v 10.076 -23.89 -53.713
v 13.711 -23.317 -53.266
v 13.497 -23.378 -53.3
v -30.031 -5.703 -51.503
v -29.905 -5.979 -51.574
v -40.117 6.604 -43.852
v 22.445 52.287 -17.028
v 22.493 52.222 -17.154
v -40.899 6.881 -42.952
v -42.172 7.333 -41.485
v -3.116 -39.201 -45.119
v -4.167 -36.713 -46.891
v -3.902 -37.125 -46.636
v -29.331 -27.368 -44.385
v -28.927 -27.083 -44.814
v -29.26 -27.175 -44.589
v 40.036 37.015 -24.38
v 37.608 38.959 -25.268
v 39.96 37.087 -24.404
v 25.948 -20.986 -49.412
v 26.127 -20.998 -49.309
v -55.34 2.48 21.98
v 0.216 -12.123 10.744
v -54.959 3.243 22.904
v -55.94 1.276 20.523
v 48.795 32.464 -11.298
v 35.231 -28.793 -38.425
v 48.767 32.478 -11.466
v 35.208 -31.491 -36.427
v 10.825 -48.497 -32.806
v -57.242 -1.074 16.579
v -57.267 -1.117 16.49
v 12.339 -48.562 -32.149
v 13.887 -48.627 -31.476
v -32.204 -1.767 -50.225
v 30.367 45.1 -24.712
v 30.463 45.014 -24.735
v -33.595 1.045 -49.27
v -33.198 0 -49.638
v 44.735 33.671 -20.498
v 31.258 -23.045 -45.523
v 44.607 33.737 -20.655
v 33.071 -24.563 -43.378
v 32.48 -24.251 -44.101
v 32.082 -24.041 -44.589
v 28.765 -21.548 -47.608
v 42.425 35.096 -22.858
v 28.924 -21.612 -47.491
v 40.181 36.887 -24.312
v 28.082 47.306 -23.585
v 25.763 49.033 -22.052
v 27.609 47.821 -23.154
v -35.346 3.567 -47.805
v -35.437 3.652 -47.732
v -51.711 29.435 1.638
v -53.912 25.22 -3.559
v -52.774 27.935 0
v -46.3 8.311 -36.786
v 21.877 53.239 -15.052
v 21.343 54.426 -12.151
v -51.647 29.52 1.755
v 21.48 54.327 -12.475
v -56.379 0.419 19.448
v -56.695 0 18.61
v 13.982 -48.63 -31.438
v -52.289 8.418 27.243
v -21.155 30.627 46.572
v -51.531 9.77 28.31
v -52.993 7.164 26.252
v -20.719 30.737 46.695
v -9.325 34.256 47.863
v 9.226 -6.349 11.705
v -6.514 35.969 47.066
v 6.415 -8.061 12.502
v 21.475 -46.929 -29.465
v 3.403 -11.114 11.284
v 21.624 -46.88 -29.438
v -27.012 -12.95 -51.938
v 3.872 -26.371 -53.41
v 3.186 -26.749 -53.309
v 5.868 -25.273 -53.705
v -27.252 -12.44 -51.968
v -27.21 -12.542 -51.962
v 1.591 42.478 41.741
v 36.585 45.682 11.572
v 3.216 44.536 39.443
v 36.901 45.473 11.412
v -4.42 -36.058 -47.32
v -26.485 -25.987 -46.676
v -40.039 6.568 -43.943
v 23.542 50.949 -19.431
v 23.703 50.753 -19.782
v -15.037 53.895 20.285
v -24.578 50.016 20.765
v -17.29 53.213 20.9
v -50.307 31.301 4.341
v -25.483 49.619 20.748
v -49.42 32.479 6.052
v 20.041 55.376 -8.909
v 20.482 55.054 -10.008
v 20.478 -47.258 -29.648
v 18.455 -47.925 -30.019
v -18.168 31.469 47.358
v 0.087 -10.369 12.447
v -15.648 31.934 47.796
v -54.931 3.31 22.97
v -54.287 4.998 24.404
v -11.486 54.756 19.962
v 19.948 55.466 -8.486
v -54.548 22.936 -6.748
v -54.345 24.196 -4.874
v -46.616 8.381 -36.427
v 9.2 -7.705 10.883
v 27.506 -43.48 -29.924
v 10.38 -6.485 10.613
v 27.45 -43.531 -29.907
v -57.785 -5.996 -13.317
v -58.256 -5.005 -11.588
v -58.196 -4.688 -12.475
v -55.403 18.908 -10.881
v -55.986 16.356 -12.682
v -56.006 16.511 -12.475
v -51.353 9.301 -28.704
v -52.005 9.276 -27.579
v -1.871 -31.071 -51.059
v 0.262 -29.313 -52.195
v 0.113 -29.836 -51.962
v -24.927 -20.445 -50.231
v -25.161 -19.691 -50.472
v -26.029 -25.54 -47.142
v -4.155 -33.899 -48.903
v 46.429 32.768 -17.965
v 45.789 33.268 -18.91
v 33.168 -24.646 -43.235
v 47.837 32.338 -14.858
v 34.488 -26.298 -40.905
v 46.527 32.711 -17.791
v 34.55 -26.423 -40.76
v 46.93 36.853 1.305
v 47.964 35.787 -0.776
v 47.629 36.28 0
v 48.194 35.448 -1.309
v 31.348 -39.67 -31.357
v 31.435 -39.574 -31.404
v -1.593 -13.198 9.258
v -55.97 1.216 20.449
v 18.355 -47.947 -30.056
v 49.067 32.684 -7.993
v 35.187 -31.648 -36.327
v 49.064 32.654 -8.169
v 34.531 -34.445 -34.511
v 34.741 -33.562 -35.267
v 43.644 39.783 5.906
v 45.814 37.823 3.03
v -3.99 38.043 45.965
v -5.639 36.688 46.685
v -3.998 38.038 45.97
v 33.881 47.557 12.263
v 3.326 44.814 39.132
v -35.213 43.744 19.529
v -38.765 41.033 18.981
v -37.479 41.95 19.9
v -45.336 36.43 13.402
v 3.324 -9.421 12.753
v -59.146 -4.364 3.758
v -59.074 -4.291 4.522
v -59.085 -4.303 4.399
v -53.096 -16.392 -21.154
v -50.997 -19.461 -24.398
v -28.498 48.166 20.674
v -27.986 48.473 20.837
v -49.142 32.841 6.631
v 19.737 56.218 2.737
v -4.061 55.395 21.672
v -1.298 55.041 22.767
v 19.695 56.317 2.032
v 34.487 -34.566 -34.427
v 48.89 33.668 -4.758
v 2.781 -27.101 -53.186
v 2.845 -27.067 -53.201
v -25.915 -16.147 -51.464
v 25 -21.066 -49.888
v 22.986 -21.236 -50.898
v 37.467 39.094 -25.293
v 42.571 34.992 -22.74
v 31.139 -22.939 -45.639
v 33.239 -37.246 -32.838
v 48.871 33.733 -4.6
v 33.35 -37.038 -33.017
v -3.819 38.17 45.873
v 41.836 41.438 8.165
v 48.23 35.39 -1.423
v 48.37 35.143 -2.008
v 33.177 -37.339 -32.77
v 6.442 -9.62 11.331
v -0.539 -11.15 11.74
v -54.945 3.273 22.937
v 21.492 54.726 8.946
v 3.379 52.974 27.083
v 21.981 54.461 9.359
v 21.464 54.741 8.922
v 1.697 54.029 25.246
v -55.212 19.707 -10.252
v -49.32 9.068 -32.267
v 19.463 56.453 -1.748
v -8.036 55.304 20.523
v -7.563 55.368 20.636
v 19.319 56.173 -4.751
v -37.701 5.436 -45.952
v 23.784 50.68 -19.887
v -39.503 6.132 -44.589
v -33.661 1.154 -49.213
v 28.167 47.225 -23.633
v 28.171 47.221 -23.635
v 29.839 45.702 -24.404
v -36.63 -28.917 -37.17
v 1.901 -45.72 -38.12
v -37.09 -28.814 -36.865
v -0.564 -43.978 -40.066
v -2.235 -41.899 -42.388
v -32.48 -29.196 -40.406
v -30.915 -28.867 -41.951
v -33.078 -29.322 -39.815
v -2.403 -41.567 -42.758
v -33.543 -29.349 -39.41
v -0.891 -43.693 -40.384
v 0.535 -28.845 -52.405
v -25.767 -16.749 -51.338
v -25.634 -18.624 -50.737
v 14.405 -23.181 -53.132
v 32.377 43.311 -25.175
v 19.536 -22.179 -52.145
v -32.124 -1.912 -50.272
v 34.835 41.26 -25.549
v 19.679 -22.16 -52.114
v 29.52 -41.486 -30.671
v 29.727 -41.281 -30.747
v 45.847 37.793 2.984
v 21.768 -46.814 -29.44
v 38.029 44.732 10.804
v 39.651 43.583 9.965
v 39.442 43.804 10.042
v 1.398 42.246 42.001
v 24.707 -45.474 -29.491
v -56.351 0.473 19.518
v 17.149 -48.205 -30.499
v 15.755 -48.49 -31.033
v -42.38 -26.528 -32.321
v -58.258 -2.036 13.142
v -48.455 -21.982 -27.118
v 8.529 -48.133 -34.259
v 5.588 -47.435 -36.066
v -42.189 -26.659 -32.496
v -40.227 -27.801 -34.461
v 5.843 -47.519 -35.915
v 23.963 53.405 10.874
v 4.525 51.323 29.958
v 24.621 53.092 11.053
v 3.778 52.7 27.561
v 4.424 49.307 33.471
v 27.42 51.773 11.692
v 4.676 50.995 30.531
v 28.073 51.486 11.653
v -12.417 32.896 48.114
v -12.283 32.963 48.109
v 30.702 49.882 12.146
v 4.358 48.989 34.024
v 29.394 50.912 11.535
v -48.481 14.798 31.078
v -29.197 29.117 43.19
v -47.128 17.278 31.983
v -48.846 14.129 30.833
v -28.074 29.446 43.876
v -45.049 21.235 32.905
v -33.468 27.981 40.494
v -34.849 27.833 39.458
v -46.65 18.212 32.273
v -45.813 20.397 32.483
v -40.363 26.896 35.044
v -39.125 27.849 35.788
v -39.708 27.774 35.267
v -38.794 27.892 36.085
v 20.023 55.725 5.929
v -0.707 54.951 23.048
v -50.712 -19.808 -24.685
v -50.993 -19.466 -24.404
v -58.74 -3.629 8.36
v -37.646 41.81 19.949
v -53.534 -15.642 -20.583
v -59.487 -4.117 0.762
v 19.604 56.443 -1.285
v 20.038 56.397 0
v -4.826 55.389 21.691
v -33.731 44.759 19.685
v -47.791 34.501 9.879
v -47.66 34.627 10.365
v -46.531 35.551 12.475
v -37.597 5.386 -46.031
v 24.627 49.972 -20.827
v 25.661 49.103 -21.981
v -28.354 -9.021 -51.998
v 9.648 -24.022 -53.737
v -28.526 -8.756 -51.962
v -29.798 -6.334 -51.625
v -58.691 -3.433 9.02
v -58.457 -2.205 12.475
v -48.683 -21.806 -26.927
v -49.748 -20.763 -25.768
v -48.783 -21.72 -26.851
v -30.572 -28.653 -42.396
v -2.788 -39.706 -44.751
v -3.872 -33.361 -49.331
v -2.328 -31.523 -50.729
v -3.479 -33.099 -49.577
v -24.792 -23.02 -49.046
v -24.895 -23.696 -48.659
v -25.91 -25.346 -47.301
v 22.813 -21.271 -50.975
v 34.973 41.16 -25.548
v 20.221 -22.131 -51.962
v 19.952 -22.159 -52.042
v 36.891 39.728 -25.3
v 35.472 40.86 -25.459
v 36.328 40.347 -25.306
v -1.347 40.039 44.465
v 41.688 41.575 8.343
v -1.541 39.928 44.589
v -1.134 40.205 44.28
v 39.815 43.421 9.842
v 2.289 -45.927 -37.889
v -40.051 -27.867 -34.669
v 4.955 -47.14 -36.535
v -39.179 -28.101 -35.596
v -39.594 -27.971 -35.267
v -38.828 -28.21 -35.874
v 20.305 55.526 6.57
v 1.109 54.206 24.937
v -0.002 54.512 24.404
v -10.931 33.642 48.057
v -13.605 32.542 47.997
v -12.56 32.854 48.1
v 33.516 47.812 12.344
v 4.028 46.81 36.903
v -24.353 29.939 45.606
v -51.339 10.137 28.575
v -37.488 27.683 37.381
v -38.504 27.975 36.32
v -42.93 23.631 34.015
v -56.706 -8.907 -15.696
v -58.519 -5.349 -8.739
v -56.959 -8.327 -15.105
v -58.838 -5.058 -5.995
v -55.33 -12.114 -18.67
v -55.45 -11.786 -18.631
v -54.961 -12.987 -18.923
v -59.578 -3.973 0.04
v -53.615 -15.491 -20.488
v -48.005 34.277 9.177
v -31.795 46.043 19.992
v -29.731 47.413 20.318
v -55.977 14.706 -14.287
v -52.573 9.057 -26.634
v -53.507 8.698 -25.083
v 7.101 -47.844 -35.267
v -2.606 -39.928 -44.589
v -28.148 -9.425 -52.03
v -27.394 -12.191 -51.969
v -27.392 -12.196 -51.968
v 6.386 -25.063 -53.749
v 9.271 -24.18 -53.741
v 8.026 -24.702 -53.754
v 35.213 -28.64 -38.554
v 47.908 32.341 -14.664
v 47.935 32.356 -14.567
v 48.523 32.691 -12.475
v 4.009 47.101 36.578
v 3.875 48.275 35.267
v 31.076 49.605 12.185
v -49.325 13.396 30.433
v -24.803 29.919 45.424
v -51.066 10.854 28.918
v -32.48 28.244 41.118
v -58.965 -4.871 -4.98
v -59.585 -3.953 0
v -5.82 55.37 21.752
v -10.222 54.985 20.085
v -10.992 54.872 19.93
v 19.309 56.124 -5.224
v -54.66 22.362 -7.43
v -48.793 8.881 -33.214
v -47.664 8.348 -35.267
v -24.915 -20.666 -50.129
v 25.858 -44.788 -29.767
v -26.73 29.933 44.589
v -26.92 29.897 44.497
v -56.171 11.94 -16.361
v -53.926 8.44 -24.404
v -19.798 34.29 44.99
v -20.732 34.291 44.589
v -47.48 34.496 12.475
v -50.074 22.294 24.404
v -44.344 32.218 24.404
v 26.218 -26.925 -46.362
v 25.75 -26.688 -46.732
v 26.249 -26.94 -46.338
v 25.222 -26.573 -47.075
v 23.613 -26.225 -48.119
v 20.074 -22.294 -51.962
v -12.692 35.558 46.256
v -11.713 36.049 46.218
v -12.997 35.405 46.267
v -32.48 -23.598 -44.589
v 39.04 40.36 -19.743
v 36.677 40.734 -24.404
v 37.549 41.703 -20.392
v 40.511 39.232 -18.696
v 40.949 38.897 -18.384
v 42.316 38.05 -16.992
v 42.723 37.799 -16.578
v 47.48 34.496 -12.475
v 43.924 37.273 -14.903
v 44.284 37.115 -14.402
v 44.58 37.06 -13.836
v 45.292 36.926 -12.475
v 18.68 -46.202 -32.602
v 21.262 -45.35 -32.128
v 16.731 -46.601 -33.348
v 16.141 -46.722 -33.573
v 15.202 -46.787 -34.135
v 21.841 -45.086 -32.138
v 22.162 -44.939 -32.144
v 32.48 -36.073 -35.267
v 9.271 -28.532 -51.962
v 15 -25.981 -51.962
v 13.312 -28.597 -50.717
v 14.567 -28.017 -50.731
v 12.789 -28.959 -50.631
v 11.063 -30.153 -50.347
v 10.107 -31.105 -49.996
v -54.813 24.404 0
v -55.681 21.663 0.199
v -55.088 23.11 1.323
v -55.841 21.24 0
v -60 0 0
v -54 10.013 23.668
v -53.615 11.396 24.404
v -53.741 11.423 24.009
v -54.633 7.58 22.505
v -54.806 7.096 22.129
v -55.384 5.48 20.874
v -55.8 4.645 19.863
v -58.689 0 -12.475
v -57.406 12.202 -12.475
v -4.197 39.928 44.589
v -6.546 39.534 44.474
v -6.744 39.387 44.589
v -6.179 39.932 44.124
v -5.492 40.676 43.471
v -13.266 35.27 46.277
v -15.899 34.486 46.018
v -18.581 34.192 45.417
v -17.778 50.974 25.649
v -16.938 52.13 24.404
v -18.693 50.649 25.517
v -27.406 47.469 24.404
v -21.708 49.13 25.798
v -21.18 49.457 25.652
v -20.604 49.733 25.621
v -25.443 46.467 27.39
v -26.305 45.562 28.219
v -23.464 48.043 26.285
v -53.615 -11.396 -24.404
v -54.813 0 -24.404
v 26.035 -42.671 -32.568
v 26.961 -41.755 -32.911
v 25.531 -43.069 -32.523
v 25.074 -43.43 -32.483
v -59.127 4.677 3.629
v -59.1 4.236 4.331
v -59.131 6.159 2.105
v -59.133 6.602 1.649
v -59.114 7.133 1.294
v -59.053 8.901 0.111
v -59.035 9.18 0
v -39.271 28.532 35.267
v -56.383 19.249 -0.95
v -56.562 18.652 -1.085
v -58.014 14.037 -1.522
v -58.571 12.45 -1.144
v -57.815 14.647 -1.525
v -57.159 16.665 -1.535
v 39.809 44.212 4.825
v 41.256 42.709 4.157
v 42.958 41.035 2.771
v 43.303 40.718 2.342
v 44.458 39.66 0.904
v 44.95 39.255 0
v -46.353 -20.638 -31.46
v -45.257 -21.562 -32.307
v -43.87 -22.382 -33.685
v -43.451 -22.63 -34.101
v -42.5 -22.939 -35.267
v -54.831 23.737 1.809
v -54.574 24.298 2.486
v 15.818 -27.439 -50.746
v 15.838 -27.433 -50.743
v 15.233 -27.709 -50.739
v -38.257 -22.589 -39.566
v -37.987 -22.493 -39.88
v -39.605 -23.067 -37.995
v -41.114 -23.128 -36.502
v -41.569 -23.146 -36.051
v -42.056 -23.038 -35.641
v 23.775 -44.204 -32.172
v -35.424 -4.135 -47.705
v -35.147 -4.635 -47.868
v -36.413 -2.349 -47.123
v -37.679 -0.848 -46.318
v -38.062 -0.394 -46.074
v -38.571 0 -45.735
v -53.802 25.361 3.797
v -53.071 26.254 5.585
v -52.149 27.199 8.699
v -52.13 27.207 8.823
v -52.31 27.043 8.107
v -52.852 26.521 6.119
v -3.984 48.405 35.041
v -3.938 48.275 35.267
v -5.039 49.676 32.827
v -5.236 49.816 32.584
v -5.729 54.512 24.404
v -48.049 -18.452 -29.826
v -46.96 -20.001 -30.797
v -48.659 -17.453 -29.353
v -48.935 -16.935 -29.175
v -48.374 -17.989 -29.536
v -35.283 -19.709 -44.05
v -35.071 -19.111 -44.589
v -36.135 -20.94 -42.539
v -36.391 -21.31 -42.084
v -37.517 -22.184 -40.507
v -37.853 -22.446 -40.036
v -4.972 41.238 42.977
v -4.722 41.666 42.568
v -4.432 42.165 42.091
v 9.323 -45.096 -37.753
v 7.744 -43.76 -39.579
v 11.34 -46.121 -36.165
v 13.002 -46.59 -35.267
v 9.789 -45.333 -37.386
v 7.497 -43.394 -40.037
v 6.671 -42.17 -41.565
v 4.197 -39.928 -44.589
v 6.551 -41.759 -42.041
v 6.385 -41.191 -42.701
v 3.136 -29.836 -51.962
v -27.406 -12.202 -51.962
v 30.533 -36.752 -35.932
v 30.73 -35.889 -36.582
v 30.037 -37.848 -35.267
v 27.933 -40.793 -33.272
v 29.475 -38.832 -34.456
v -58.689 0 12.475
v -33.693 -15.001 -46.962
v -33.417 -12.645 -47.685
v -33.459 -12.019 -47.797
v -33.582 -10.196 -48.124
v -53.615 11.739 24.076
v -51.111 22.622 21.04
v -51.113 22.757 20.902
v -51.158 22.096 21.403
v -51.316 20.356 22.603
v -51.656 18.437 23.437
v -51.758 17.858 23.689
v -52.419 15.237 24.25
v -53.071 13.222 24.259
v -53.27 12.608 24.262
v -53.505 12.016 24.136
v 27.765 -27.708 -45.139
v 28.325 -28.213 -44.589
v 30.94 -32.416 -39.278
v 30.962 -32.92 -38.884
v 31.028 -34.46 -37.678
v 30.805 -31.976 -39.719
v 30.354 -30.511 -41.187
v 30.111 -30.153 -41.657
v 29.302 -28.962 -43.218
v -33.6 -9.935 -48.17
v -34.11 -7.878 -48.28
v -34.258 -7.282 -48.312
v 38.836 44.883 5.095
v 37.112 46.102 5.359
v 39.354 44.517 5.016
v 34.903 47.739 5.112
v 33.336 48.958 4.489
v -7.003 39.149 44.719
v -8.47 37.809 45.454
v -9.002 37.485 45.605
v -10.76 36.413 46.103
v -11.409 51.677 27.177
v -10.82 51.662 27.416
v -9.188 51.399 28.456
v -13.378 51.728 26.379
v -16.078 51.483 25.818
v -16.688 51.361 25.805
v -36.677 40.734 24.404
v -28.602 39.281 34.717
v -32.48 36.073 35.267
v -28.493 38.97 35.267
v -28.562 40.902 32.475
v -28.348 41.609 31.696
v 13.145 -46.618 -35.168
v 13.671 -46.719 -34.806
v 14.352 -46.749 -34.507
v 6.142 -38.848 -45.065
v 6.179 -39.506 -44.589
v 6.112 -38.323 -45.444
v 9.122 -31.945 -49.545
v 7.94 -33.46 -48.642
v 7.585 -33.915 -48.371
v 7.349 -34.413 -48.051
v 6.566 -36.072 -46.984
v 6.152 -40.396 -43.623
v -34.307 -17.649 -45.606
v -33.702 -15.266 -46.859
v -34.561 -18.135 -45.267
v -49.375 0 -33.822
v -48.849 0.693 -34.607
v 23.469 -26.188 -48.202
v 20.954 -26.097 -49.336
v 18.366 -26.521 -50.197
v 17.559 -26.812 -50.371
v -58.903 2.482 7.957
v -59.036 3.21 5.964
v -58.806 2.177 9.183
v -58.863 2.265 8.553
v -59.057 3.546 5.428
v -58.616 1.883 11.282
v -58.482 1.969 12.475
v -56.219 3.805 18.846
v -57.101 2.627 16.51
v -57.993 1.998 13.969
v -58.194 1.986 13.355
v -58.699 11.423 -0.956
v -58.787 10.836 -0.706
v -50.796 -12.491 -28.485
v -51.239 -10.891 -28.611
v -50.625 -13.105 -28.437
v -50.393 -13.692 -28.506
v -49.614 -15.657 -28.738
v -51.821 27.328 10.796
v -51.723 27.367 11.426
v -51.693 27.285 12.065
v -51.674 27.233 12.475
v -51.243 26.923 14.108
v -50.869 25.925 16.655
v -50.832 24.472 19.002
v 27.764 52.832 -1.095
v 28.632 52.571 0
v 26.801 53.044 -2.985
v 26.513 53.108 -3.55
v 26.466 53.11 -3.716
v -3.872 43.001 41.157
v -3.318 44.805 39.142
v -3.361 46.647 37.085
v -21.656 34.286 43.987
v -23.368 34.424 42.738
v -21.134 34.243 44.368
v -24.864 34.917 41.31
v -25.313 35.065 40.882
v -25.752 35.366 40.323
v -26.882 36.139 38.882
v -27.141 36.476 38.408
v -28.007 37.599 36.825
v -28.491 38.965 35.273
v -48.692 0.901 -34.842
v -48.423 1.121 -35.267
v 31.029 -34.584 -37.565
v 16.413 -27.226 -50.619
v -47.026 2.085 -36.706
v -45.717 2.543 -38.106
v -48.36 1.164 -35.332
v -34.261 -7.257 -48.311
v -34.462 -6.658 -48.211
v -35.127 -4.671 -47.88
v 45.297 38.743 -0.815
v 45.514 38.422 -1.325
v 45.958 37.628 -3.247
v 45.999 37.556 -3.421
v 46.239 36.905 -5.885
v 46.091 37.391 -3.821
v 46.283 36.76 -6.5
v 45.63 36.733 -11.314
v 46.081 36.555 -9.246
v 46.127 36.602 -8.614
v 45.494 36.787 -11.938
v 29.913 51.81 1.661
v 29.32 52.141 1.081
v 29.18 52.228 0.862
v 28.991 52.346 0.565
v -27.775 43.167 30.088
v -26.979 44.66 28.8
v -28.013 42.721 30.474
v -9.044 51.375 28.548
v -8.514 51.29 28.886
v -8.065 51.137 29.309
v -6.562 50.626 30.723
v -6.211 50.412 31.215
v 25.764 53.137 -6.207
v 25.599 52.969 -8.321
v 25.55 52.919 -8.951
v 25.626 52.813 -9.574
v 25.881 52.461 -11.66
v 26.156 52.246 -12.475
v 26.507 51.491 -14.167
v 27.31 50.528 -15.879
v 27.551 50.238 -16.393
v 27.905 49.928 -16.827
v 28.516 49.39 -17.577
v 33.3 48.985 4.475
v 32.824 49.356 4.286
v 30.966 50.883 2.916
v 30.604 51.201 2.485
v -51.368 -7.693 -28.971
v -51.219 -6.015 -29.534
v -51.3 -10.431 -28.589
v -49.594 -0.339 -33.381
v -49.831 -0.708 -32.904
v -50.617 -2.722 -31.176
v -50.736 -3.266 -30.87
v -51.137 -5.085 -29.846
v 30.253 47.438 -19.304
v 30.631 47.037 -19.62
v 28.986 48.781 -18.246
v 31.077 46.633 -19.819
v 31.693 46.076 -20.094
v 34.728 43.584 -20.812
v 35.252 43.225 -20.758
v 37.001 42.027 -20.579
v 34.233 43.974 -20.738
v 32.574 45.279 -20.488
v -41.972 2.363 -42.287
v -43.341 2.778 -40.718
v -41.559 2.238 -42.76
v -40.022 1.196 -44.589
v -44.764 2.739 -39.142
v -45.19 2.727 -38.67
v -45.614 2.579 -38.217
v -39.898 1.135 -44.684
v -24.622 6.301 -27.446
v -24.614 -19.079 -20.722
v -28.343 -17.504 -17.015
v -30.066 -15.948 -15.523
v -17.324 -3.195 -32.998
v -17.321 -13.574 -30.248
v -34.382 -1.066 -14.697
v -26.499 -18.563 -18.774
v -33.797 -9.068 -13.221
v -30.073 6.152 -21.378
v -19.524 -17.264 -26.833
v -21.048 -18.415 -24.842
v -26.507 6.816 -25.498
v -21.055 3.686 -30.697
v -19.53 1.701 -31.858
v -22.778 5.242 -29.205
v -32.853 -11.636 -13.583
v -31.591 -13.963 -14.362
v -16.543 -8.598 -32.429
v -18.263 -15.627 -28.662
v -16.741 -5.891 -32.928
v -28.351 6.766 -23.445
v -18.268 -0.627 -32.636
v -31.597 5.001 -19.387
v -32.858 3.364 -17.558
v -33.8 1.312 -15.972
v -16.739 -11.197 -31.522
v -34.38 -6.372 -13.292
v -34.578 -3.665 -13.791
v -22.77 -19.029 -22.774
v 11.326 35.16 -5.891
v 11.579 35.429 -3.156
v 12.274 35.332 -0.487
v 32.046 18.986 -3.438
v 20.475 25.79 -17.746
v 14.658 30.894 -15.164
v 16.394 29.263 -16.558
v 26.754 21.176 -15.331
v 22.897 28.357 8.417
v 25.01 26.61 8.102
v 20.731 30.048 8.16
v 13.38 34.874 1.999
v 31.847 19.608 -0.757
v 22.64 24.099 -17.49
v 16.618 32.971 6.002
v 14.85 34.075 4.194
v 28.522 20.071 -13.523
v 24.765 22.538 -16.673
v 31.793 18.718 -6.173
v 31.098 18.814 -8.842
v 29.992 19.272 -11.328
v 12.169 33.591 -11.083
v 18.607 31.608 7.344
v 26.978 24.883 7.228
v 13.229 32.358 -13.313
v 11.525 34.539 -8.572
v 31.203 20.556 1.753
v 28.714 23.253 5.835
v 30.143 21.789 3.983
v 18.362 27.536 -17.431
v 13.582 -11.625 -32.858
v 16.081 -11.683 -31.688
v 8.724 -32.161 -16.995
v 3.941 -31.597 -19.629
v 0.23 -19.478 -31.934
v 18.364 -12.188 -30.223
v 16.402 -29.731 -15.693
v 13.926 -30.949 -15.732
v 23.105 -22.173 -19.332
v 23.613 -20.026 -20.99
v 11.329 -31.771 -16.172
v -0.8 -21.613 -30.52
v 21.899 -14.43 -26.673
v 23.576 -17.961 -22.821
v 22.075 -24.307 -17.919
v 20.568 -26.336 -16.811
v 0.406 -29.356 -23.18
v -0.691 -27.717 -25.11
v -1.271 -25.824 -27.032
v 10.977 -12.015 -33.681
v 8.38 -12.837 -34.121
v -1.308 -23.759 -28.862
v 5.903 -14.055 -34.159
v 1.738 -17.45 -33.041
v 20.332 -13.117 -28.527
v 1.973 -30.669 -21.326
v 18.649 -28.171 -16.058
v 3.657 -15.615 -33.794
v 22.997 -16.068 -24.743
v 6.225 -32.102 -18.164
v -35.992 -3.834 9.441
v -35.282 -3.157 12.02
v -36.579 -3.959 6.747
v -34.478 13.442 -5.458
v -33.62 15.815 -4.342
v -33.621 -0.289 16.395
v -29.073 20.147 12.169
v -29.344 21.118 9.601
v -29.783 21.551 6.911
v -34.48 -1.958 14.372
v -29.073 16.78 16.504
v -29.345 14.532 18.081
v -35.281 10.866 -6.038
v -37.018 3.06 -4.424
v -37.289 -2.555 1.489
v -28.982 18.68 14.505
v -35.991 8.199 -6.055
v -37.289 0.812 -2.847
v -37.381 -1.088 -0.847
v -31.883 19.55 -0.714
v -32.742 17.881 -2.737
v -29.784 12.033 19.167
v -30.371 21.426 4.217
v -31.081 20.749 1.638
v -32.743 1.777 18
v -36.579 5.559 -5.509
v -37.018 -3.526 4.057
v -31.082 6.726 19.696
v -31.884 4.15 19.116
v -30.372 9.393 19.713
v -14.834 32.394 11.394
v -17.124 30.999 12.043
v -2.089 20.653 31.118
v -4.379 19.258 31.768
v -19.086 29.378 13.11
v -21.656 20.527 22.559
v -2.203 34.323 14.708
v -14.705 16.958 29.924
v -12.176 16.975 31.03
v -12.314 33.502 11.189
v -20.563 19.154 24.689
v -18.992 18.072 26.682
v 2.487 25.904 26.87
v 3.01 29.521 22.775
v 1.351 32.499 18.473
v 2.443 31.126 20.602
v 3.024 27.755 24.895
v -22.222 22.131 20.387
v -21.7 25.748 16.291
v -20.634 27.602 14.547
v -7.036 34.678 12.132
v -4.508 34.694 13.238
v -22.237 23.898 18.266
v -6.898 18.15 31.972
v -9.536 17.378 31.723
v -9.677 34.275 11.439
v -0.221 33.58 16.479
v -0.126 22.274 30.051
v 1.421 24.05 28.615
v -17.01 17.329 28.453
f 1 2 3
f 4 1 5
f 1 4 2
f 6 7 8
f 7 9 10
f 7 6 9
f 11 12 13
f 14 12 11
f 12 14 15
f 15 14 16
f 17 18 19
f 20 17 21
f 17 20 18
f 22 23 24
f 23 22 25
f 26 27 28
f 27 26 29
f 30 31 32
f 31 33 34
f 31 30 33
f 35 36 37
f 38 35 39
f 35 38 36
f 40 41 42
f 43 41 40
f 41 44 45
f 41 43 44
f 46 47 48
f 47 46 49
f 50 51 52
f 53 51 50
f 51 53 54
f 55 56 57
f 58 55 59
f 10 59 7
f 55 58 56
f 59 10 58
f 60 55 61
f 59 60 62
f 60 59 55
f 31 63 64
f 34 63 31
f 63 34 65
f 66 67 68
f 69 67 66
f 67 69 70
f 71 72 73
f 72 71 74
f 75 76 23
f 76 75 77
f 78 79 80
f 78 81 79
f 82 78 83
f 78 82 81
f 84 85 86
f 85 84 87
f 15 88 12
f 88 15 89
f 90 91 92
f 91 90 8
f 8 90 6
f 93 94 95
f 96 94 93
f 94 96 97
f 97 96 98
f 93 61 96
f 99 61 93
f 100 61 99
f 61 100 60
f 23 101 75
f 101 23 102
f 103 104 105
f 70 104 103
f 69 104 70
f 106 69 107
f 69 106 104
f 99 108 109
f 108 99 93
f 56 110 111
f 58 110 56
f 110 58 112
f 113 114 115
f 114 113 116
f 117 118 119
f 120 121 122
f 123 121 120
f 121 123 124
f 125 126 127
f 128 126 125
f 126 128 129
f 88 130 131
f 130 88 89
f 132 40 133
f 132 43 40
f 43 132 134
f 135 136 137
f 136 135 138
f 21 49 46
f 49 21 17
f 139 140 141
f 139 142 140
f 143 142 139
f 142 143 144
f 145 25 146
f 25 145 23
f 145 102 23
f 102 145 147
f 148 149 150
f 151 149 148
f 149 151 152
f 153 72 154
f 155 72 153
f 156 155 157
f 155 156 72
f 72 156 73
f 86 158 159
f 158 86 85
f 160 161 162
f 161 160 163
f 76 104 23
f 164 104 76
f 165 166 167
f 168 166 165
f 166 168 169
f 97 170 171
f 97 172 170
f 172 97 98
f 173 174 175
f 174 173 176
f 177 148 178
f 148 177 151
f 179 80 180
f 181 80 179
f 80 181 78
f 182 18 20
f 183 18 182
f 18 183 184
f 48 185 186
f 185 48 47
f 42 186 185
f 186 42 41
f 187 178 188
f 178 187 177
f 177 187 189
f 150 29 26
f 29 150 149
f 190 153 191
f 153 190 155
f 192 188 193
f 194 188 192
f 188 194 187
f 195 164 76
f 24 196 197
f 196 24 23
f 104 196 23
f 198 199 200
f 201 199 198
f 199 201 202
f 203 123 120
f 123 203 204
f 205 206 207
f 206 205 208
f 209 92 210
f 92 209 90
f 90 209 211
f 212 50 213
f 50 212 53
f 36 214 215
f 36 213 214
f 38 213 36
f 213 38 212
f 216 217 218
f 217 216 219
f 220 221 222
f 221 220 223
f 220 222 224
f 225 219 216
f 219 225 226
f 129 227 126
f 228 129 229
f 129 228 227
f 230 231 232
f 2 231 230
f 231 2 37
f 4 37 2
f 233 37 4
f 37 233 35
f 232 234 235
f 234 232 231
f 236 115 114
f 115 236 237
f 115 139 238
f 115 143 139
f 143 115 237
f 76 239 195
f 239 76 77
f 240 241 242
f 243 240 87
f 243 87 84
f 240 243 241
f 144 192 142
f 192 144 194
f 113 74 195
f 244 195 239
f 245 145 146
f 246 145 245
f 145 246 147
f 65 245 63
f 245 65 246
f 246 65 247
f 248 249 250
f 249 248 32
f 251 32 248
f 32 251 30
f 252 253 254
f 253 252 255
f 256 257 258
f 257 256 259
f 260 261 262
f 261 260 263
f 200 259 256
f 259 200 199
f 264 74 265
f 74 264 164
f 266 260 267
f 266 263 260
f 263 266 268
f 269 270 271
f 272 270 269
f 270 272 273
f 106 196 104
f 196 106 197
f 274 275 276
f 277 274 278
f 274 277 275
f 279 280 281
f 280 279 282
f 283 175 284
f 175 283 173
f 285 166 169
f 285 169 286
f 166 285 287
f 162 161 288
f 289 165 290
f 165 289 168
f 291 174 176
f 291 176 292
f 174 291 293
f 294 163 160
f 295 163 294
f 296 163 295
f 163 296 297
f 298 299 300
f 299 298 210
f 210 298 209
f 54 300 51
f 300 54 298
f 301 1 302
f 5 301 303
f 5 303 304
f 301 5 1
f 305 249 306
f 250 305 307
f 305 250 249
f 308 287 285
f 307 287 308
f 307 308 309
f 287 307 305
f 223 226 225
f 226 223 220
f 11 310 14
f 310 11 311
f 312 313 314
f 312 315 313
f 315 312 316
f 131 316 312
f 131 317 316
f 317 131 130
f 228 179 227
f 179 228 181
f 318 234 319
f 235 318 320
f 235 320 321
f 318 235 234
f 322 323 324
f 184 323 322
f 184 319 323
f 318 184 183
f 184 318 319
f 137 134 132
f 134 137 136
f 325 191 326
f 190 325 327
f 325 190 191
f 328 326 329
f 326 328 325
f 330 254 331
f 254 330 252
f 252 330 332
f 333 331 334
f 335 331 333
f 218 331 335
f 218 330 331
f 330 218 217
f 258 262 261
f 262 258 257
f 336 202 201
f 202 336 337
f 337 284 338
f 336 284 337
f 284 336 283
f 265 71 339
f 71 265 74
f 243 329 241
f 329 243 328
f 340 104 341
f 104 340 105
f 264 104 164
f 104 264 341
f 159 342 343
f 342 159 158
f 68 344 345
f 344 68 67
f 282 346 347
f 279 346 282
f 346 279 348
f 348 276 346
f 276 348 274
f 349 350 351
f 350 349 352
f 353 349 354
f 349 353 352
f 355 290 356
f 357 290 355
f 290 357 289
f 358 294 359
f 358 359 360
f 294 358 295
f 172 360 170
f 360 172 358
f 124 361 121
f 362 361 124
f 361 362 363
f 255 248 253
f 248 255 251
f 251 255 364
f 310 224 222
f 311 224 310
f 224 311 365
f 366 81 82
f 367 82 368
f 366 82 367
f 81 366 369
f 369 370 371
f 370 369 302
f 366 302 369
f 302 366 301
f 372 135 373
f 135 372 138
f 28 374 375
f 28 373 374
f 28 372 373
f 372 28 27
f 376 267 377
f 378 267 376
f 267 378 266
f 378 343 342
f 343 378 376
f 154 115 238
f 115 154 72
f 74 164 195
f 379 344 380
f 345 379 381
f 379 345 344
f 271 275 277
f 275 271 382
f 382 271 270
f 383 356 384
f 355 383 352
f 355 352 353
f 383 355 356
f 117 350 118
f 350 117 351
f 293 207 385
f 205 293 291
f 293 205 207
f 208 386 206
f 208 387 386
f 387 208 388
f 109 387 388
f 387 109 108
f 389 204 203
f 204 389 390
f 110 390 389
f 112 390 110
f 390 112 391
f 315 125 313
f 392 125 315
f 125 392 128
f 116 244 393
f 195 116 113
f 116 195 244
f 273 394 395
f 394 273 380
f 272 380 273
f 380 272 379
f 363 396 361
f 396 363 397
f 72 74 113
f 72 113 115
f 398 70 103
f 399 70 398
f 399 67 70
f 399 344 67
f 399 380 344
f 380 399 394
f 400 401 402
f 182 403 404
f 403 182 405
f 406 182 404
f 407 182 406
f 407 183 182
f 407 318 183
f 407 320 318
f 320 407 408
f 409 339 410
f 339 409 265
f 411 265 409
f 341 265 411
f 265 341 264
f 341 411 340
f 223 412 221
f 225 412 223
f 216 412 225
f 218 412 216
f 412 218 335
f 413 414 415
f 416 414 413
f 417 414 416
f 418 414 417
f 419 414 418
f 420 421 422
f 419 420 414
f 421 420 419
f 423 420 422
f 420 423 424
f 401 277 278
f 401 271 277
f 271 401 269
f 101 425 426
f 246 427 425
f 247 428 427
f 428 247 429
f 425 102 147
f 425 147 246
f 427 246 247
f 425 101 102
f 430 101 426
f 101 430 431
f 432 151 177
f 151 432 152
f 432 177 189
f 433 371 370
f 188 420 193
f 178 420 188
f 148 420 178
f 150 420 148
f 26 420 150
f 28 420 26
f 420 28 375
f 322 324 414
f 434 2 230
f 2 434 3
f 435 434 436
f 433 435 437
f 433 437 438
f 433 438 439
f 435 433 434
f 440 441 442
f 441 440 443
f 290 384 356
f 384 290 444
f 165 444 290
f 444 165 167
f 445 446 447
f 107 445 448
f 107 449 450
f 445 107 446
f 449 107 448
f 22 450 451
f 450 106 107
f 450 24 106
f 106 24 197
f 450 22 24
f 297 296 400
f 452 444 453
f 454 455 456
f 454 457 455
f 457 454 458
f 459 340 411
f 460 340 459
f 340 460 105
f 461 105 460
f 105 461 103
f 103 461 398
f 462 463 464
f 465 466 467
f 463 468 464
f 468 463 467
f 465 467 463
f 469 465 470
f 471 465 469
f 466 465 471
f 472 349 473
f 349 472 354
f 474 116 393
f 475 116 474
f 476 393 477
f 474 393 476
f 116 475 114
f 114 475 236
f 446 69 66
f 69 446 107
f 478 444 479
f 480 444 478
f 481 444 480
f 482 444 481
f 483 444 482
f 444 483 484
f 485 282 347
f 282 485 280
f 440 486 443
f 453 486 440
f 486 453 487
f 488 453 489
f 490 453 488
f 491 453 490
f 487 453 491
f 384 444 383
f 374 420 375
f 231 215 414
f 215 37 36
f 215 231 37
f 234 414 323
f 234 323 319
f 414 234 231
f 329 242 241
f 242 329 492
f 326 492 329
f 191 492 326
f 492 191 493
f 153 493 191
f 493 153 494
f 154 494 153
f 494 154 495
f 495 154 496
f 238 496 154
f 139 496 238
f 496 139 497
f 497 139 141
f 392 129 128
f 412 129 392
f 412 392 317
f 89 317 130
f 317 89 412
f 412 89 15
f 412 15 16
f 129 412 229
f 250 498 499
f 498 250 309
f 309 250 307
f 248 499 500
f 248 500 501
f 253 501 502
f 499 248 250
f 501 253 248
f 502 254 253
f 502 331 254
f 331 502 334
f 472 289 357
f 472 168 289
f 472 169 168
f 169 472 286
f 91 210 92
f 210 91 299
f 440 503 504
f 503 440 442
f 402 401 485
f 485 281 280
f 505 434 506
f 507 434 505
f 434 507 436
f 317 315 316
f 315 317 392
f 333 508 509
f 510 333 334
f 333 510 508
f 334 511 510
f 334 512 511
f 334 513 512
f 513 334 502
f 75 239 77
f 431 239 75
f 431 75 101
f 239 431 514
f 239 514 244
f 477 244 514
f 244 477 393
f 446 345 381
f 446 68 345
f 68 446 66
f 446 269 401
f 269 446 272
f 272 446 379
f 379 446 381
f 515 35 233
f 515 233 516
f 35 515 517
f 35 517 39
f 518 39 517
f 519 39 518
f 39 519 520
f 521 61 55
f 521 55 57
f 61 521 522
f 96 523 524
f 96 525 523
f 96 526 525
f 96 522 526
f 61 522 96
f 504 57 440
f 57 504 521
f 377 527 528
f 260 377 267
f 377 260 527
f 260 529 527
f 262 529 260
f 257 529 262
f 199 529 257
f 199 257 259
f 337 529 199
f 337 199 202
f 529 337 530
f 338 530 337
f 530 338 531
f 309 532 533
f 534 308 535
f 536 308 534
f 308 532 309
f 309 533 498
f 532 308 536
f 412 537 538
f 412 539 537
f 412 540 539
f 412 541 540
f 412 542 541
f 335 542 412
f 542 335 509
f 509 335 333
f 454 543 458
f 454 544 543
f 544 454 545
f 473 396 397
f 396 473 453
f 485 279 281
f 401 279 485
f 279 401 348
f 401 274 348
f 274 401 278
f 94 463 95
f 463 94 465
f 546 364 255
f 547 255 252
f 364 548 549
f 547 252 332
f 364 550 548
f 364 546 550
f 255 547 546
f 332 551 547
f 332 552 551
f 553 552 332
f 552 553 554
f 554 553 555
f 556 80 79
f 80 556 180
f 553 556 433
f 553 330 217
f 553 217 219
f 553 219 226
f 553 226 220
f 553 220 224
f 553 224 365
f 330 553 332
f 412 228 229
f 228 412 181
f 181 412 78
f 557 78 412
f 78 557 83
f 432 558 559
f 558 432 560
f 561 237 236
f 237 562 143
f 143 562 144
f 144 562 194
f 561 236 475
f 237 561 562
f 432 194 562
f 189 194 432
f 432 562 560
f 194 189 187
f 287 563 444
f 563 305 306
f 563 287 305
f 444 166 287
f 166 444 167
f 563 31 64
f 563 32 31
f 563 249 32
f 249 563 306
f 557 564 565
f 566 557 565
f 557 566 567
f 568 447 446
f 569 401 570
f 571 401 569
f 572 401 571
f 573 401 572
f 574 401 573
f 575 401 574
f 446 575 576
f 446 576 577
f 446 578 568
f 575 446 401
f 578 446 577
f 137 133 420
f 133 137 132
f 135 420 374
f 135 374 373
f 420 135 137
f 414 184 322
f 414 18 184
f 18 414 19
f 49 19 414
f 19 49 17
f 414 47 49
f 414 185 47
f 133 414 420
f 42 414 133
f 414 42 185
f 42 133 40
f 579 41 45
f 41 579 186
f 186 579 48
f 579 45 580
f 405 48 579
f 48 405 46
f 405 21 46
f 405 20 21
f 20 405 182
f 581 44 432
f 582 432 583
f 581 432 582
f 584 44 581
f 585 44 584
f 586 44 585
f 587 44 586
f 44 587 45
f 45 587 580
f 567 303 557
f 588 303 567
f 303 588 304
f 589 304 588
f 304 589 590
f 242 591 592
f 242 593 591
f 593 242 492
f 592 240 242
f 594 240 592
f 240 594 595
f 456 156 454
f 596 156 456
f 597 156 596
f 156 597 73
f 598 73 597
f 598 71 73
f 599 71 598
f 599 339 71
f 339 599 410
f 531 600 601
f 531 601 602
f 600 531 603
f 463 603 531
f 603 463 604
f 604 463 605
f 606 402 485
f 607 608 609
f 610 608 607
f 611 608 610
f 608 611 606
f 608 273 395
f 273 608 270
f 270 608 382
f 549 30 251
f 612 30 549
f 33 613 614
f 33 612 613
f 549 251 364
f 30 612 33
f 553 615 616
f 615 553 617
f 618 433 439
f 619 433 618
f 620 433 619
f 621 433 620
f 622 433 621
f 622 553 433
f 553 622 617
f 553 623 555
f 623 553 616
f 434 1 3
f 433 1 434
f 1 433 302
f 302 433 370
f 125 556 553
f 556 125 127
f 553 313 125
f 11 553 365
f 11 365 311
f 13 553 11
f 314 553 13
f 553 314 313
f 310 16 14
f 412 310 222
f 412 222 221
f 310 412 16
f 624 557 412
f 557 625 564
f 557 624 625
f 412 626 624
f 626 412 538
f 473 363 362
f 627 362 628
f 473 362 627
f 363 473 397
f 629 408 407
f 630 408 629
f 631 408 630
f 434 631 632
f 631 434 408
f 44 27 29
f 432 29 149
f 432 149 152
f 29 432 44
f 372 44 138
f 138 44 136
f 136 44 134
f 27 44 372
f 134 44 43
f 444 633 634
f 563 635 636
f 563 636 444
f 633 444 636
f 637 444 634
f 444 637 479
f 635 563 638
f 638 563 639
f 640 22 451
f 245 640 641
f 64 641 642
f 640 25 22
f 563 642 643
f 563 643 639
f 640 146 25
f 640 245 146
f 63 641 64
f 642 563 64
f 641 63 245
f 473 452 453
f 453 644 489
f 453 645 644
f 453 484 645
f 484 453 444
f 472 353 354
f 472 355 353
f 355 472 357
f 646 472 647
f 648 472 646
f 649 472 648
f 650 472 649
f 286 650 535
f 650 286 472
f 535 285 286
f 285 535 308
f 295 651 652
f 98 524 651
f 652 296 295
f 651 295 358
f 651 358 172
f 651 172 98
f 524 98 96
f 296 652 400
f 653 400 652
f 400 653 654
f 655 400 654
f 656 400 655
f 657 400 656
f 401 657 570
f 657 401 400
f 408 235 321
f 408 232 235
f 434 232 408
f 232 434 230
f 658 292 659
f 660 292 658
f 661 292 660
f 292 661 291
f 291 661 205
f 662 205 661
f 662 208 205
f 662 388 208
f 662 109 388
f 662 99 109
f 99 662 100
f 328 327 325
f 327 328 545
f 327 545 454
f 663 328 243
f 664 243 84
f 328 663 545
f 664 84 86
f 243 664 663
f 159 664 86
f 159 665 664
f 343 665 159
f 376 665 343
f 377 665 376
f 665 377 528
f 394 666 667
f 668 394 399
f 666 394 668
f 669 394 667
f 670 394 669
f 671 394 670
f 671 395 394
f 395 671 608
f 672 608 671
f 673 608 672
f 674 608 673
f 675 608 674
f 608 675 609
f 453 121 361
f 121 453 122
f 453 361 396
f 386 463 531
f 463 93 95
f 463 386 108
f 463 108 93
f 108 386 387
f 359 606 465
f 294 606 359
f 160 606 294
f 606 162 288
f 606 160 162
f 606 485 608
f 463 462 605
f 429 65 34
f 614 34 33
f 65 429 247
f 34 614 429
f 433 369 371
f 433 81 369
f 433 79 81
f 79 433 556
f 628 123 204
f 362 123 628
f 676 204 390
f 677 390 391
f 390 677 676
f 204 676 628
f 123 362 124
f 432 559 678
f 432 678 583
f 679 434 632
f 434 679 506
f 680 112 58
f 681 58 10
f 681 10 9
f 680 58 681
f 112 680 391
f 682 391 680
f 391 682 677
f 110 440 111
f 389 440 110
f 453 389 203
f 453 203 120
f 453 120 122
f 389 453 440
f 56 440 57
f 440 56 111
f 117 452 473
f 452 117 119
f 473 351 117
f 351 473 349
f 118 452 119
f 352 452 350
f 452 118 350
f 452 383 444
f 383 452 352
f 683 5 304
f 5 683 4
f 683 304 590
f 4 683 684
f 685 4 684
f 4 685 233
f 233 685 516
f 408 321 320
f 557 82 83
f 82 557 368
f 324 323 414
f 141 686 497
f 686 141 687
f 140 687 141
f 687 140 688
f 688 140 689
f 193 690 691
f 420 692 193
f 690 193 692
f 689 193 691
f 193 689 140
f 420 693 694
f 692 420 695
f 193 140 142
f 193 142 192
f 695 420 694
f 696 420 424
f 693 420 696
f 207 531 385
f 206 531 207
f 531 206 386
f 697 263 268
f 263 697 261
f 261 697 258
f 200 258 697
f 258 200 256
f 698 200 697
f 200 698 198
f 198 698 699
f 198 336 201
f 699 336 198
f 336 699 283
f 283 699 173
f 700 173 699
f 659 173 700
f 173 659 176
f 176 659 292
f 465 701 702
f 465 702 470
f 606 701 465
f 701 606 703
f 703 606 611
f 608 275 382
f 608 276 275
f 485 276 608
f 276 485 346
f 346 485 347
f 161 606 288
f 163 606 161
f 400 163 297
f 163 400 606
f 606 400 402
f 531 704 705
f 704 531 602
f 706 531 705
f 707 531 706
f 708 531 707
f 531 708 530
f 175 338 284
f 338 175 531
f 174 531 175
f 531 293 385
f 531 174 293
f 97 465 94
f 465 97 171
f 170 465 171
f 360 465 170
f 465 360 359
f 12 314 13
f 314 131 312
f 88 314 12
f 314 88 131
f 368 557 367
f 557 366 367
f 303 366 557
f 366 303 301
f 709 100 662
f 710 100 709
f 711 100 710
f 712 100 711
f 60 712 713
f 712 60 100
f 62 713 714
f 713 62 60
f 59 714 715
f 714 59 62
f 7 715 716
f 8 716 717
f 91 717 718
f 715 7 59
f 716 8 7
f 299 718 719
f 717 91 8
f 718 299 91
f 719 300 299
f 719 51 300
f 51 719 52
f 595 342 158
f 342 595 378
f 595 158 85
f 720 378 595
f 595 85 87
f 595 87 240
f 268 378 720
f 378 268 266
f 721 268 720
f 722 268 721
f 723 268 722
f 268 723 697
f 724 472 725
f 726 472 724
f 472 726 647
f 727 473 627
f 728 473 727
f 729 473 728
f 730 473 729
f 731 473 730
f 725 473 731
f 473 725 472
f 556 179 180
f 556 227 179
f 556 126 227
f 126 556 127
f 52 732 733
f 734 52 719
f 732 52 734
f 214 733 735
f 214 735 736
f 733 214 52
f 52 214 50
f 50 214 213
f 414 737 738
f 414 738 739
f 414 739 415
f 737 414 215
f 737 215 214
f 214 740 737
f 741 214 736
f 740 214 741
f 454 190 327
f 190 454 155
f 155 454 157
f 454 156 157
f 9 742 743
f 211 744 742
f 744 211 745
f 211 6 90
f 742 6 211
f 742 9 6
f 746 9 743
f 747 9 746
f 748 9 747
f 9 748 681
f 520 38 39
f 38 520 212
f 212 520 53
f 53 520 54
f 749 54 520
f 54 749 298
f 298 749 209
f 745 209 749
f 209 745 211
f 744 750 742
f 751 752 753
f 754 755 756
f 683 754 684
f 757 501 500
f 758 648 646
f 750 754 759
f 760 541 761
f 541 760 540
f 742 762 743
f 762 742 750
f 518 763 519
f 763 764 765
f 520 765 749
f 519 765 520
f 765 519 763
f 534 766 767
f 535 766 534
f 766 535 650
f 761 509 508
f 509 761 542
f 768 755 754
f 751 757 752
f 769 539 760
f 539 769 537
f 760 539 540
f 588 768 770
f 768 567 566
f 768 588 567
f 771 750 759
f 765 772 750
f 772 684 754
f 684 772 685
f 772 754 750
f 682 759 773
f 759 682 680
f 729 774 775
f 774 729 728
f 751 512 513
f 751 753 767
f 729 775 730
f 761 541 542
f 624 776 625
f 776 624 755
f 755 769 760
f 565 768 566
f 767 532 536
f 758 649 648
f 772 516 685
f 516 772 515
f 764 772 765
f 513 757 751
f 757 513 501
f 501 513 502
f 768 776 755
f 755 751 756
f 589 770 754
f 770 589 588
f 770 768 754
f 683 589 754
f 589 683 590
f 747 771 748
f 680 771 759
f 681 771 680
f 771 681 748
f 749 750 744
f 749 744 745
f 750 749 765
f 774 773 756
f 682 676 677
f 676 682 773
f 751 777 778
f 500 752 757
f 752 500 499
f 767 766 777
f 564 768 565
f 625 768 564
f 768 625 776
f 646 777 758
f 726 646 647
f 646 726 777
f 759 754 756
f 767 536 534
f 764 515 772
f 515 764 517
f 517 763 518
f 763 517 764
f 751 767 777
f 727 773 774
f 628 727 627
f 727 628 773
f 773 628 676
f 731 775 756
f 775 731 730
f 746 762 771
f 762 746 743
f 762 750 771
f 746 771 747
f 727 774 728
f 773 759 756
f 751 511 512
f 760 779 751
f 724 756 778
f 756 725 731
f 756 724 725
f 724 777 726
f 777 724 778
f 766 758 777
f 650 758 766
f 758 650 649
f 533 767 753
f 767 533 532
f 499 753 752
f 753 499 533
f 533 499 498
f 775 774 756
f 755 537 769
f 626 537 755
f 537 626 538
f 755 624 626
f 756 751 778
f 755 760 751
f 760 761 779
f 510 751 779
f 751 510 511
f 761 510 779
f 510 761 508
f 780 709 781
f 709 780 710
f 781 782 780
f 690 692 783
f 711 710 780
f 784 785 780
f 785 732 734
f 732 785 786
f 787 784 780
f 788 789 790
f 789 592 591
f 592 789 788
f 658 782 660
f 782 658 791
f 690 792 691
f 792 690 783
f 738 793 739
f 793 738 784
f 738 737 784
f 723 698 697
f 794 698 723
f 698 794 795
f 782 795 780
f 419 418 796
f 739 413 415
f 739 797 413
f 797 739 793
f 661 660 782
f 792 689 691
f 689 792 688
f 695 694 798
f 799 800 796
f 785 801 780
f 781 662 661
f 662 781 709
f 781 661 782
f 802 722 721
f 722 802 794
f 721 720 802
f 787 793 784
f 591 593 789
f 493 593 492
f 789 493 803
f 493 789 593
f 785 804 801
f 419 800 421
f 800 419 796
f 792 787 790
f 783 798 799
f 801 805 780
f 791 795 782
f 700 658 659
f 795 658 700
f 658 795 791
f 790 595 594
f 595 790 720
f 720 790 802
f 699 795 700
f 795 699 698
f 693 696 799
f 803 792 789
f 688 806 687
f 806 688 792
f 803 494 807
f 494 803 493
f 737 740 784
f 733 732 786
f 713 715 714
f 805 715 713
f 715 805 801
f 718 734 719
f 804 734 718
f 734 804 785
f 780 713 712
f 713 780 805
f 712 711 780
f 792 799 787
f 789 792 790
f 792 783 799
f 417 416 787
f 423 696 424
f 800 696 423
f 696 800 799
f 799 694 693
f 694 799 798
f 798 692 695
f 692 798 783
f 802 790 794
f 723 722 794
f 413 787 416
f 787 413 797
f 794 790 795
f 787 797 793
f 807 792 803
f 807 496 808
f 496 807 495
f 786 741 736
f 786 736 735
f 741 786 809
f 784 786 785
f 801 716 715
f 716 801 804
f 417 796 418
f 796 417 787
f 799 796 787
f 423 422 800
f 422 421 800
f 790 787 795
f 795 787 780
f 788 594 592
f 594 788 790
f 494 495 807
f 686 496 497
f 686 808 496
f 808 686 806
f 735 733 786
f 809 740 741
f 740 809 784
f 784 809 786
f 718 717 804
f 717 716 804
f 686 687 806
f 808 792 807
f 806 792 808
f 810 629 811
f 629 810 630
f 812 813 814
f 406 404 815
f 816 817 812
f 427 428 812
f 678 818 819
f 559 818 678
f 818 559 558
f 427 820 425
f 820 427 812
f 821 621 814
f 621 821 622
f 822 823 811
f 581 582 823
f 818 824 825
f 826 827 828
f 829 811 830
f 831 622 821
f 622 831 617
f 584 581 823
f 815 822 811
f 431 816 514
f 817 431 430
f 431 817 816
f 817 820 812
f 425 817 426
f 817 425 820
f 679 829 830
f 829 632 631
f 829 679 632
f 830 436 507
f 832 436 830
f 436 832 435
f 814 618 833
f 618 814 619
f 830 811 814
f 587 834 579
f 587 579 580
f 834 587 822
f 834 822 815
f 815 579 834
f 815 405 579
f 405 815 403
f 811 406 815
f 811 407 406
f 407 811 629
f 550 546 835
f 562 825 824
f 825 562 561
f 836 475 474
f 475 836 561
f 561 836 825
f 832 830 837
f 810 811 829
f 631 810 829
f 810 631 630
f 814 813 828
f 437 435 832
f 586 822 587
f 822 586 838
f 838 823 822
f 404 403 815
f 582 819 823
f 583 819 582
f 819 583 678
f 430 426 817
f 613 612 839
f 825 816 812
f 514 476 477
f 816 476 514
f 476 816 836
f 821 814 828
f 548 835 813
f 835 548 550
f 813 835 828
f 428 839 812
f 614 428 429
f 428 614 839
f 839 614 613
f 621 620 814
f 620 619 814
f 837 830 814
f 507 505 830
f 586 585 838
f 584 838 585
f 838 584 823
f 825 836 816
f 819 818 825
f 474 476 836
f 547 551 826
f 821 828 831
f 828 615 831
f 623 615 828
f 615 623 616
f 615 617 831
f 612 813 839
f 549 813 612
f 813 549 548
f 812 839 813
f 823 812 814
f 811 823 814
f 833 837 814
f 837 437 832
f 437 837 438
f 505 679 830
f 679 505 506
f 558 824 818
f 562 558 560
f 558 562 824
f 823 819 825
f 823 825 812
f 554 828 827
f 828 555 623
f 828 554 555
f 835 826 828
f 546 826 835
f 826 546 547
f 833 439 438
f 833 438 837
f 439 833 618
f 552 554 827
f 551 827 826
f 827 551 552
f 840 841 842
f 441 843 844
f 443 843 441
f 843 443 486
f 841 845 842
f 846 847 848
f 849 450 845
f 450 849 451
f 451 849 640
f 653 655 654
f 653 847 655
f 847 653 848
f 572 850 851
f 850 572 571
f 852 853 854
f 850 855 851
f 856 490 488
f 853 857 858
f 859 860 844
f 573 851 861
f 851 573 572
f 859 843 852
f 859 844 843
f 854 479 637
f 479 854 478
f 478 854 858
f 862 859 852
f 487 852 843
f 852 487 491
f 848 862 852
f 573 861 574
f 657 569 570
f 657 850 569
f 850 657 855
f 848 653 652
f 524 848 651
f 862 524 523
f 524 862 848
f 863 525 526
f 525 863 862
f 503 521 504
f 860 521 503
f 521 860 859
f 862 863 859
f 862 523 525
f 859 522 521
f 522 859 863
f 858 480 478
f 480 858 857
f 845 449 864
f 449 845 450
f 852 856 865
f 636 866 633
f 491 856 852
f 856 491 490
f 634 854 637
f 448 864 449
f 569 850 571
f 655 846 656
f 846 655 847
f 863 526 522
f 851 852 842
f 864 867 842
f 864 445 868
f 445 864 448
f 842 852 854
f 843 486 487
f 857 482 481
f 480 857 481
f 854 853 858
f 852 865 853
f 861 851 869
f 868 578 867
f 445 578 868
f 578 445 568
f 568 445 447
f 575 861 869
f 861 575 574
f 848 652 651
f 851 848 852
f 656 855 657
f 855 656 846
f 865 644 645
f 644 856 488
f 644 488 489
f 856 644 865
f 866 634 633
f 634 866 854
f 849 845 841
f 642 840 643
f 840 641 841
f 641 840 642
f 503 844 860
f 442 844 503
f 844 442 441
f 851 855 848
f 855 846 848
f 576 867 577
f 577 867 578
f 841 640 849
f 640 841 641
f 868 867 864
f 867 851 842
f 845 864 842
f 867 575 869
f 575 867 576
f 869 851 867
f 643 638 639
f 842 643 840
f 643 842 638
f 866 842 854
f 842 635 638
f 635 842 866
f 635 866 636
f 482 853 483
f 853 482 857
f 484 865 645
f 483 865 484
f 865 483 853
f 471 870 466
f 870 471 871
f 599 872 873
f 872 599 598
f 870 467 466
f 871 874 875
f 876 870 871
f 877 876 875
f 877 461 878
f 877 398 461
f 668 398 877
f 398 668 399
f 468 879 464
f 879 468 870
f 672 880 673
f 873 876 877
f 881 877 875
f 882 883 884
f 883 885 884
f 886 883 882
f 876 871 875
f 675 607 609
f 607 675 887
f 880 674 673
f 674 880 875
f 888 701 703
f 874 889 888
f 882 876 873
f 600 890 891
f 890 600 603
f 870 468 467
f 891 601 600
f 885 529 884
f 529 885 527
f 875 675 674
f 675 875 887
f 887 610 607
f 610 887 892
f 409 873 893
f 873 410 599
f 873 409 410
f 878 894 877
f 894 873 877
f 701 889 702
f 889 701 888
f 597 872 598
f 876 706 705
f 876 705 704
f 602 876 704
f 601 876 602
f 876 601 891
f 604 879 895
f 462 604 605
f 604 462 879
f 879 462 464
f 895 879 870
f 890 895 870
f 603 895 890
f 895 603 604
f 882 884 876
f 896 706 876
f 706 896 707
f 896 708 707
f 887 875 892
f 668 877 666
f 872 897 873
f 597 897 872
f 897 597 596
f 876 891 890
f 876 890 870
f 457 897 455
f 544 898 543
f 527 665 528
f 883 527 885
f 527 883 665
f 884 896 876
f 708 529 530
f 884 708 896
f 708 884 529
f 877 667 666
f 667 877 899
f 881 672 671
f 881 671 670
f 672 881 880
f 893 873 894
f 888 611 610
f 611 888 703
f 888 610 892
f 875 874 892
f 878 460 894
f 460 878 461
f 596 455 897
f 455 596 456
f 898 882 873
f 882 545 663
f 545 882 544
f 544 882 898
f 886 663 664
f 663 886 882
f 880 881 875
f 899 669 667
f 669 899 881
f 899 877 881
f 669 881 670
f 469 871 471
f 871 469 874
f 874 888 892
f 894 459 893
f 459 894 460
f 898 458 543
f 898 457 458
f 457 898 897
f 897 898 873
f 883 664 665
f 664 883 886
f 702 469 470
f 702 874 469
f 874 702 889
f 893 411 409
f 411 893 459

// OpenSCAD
difference() {
	intersection() {
		hull() {
			rotate(a = -121.8002487075, v = [-0.5847885275, -0.6167139367, 0.0000000000]) {
				rotate(a = -90.0000000000, v = [-0.9914448614, -0.1305261922, 0.0000000000]) {
					cylinder(h = 60, r = 16.2000000000);
				}
			}
			rotate(a = -121.8002487075, v = [-0.5847885275, -0.6167139367, 0.0000000000]) {
				rotate(a = -90.0000000000, v = [0.6087614290, -0.7933533403, 0.0000000000]) {
					cylinder(h = 60, r = 16.2000000000);
				}
			}
			rotate(a = -121.8002487075, v = [-0.5847885275, -0.6167139367, 0.0000000000]) {
				rotate(a = -20.3482733305, v = [-0.3468424841, -0.0247683702, 0.0000000000]) {
					cylinder(h = 60, r = 16.2000000000);
				}
			}
			rotate(a = -121.8002487075, v = [-0.5847885275, -0.6167139367, 0.0000000000]) {
				rotate(a = -146.5585275075, v = [-0.5390549824, 0.1145175815, 0.0000000000]) {
					cylinder(h = 60, r = 16.2000000000);
				}
			}
			rotate(a = -121.8002487075, v = [-0.5847885275, -0.6167139367, 0.0000000000]) {
				rotate(a = -157.7736717199, v = [0.3557637402, -0.1285203412, 0.0000000000]) {
					cylinder(h = 60, r = 16.2000000000);
				}
			}
		}
		sphere(r = 60);
	}
	union() {
		rotate(a = -121.8002487075, v = [-0.5847885275, -0.6167139367, 0.0000000000]) {
			rotate(a = -90.0000000000, v = [-0.9914448614, -0.1305261922, 0.0000000000]) {
				translate(v = [0, 0, 35]) {
					cylinder(h = 100, r = 13.2000000000);
				}
			}
		}
		rotate(a = -121.8002487075, v = [-0.5847885275, -0.6167139367, 0.0000000000]) {
			rotate(a = -90.0000000000, v = [0.6087614290, -0.7933533403, 0.0000000000]) {
				translate(v = [0, 0, 35]) {
					cylinder(h = 100, r = 13.2000000000);
				}
			}
		}
		rotate(a = -121.8002487075, v = [-0.5847885275, -0.6167139367, 0.0000000000]) {
			rotate(a = -20.3482733305, v = [-0.3468424841, -0.0247683702, 0.0000000000]) {
				translate(v = [0, 0, 35]) {
					cylinder(h = 100, r = 13.2000000000);
				}
			}
		}
		rotate(a = -121.8002487075, v = [-0.5847885275, -0.6167139367, 0.0000000000]) {
			rotate(a = -146.5585275075, v = [-0.5390549824, 0.1145175815, 0.0000000000]) {
				translate(v = [0, 0, 35]) {
					cylinder(h = 100, r = 13.2000000000);
				}
			}
		}
		rotate(a = -121.8002487075, v = [-0.5847885275, -0.6167139367, 0.0000000000]) {
			rotate(a = -157.7736717199, v = [0.3557637402, -0.1285203412, 0.0000000000]) {
				translate(v = [0, 0, 35]) {
					cylinder(h = 100, r = 13.2000000000);
				}
			}
		}
	}
}
